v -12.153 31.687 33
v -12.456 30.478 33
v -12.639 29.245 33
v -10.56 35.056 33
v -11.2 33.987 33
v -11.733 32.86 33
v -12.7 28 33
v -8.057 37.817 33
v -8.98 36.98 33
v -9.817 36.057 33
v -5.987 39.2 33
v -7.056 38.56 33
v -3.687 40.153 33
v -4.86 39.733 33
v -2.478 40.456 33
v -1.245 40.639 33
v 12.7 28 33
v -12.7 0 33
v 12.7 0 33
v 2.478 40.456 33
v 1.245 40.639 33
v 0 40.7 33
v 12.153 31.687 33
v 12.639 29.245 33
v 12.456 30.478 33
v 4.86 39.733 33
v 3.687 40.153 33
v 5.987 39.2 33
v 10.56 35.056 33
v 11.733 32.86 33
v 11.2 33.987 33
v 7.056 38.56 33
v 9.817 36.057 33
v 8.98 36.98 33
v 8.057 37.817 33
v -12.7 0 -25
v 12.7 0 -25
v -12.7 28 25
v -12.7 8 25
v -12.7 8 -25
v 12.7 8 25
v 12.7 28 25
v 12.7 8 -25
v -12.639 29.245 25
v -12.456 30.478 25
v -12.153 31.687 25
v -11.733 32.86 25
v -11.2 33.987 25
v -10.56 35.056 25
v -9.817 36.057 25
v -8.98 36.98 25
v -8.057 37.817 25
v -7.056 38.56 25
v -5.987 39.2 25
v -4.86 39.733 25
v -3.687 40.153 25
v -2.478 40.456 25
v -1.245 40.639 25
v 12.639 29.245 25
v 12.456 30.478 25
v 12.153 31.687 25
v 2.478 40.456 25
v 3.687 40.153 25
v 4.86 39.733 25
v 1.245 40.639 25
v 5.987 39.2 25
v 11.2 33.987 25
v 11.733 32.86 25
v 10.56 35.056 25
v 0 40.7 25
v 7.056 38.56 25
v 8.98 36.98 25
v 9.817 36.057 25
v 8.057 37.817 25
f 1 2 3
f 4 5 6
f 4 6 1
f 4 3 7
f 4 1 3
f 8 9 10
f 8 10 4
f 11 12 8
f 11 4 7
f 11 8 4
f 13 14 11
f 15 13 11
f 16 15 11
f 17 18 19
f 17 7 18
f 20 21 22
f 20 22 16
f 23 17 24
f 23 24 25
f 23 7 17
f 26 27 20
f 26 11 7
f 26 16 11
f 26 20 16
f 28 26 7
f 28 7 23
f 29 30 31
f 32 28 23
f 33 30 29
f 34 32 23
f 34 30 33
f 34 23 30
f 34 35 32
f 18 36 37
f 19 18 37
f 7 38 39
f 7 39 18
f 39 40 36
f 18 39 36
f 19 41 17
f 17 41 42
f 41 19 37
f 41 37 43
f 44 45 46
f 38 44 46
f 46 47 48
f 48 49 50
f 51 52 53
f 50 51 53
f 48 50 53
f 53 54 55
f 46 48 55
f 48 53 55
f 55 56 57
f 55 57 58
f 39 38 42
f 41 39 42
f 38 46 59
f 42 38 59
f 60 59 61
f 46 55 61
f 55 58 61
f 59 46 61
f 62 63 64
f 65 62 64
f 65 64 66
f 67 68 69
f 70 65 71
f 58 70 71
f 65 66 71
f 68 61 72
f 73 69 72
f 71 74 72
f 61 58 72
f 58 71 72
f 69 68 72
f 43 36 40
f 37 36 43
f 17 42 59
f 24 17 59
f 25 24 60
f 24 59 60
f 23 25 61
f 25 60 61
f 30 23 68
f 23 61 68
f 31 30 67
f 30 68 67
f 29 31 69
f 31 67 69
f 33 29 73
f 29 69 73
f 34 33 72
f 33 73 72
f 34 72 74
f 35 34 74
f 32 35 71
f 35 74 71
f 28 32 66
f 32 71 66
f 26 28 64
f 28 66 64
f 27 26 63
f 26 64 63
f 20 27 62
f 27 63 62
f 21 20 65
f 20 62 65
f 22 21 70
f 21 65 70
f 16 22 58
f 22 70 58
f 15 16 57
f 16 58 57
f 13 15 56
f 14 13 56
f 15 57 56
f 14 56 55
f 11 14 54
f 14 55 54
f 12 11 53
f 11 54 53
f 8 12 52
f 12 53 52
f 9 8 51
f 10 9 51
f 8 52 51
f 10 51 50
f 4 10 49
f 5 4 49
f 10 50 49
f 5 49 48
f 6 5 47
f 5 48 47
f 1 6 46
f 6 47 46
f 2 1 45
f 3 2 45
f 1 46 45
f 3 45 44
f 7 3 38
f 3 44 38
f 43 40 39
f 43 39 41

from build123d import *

# Parameters (mm, degrees)
SKETCH1_W           = 25.4
SKETCH1_H           = 50
BOSS_EXTRUDE2_DEPTH = 8
BOSS_EXTRUDE4_DEPTH = 8


with BuildPart() as part:
    # Sketch1 → Boss-Extrude2 (new body)
    with BuildSketch(Plane(origin=(0, 0, 0), x_dir=(1, 0, 0), z_dir=(0, 1, 0))):
        Rectangle(SKETCH1_W, SKETCH1_H)
    extrude(amount=BOSS_EXTRUDE2_DEPTH)

    # Sketch4 → Boss-Extrude4 (add)
    with BuildSketch(Plane.XY.offset(25)):
        with BuildLine():
            Line((-12.7, 0), (12.7, 0))
            Line((12.7, 0), (12.7, 28))
            ThreePointArc((12.7, 28), (0, 40.7), (-12.7, 28))
            Line((-12.7, 28), (-12.7, 0))
        make_face()
    extrude(amount=BOSS_EXTRUDE4_DEPTH)


solid = part.part
